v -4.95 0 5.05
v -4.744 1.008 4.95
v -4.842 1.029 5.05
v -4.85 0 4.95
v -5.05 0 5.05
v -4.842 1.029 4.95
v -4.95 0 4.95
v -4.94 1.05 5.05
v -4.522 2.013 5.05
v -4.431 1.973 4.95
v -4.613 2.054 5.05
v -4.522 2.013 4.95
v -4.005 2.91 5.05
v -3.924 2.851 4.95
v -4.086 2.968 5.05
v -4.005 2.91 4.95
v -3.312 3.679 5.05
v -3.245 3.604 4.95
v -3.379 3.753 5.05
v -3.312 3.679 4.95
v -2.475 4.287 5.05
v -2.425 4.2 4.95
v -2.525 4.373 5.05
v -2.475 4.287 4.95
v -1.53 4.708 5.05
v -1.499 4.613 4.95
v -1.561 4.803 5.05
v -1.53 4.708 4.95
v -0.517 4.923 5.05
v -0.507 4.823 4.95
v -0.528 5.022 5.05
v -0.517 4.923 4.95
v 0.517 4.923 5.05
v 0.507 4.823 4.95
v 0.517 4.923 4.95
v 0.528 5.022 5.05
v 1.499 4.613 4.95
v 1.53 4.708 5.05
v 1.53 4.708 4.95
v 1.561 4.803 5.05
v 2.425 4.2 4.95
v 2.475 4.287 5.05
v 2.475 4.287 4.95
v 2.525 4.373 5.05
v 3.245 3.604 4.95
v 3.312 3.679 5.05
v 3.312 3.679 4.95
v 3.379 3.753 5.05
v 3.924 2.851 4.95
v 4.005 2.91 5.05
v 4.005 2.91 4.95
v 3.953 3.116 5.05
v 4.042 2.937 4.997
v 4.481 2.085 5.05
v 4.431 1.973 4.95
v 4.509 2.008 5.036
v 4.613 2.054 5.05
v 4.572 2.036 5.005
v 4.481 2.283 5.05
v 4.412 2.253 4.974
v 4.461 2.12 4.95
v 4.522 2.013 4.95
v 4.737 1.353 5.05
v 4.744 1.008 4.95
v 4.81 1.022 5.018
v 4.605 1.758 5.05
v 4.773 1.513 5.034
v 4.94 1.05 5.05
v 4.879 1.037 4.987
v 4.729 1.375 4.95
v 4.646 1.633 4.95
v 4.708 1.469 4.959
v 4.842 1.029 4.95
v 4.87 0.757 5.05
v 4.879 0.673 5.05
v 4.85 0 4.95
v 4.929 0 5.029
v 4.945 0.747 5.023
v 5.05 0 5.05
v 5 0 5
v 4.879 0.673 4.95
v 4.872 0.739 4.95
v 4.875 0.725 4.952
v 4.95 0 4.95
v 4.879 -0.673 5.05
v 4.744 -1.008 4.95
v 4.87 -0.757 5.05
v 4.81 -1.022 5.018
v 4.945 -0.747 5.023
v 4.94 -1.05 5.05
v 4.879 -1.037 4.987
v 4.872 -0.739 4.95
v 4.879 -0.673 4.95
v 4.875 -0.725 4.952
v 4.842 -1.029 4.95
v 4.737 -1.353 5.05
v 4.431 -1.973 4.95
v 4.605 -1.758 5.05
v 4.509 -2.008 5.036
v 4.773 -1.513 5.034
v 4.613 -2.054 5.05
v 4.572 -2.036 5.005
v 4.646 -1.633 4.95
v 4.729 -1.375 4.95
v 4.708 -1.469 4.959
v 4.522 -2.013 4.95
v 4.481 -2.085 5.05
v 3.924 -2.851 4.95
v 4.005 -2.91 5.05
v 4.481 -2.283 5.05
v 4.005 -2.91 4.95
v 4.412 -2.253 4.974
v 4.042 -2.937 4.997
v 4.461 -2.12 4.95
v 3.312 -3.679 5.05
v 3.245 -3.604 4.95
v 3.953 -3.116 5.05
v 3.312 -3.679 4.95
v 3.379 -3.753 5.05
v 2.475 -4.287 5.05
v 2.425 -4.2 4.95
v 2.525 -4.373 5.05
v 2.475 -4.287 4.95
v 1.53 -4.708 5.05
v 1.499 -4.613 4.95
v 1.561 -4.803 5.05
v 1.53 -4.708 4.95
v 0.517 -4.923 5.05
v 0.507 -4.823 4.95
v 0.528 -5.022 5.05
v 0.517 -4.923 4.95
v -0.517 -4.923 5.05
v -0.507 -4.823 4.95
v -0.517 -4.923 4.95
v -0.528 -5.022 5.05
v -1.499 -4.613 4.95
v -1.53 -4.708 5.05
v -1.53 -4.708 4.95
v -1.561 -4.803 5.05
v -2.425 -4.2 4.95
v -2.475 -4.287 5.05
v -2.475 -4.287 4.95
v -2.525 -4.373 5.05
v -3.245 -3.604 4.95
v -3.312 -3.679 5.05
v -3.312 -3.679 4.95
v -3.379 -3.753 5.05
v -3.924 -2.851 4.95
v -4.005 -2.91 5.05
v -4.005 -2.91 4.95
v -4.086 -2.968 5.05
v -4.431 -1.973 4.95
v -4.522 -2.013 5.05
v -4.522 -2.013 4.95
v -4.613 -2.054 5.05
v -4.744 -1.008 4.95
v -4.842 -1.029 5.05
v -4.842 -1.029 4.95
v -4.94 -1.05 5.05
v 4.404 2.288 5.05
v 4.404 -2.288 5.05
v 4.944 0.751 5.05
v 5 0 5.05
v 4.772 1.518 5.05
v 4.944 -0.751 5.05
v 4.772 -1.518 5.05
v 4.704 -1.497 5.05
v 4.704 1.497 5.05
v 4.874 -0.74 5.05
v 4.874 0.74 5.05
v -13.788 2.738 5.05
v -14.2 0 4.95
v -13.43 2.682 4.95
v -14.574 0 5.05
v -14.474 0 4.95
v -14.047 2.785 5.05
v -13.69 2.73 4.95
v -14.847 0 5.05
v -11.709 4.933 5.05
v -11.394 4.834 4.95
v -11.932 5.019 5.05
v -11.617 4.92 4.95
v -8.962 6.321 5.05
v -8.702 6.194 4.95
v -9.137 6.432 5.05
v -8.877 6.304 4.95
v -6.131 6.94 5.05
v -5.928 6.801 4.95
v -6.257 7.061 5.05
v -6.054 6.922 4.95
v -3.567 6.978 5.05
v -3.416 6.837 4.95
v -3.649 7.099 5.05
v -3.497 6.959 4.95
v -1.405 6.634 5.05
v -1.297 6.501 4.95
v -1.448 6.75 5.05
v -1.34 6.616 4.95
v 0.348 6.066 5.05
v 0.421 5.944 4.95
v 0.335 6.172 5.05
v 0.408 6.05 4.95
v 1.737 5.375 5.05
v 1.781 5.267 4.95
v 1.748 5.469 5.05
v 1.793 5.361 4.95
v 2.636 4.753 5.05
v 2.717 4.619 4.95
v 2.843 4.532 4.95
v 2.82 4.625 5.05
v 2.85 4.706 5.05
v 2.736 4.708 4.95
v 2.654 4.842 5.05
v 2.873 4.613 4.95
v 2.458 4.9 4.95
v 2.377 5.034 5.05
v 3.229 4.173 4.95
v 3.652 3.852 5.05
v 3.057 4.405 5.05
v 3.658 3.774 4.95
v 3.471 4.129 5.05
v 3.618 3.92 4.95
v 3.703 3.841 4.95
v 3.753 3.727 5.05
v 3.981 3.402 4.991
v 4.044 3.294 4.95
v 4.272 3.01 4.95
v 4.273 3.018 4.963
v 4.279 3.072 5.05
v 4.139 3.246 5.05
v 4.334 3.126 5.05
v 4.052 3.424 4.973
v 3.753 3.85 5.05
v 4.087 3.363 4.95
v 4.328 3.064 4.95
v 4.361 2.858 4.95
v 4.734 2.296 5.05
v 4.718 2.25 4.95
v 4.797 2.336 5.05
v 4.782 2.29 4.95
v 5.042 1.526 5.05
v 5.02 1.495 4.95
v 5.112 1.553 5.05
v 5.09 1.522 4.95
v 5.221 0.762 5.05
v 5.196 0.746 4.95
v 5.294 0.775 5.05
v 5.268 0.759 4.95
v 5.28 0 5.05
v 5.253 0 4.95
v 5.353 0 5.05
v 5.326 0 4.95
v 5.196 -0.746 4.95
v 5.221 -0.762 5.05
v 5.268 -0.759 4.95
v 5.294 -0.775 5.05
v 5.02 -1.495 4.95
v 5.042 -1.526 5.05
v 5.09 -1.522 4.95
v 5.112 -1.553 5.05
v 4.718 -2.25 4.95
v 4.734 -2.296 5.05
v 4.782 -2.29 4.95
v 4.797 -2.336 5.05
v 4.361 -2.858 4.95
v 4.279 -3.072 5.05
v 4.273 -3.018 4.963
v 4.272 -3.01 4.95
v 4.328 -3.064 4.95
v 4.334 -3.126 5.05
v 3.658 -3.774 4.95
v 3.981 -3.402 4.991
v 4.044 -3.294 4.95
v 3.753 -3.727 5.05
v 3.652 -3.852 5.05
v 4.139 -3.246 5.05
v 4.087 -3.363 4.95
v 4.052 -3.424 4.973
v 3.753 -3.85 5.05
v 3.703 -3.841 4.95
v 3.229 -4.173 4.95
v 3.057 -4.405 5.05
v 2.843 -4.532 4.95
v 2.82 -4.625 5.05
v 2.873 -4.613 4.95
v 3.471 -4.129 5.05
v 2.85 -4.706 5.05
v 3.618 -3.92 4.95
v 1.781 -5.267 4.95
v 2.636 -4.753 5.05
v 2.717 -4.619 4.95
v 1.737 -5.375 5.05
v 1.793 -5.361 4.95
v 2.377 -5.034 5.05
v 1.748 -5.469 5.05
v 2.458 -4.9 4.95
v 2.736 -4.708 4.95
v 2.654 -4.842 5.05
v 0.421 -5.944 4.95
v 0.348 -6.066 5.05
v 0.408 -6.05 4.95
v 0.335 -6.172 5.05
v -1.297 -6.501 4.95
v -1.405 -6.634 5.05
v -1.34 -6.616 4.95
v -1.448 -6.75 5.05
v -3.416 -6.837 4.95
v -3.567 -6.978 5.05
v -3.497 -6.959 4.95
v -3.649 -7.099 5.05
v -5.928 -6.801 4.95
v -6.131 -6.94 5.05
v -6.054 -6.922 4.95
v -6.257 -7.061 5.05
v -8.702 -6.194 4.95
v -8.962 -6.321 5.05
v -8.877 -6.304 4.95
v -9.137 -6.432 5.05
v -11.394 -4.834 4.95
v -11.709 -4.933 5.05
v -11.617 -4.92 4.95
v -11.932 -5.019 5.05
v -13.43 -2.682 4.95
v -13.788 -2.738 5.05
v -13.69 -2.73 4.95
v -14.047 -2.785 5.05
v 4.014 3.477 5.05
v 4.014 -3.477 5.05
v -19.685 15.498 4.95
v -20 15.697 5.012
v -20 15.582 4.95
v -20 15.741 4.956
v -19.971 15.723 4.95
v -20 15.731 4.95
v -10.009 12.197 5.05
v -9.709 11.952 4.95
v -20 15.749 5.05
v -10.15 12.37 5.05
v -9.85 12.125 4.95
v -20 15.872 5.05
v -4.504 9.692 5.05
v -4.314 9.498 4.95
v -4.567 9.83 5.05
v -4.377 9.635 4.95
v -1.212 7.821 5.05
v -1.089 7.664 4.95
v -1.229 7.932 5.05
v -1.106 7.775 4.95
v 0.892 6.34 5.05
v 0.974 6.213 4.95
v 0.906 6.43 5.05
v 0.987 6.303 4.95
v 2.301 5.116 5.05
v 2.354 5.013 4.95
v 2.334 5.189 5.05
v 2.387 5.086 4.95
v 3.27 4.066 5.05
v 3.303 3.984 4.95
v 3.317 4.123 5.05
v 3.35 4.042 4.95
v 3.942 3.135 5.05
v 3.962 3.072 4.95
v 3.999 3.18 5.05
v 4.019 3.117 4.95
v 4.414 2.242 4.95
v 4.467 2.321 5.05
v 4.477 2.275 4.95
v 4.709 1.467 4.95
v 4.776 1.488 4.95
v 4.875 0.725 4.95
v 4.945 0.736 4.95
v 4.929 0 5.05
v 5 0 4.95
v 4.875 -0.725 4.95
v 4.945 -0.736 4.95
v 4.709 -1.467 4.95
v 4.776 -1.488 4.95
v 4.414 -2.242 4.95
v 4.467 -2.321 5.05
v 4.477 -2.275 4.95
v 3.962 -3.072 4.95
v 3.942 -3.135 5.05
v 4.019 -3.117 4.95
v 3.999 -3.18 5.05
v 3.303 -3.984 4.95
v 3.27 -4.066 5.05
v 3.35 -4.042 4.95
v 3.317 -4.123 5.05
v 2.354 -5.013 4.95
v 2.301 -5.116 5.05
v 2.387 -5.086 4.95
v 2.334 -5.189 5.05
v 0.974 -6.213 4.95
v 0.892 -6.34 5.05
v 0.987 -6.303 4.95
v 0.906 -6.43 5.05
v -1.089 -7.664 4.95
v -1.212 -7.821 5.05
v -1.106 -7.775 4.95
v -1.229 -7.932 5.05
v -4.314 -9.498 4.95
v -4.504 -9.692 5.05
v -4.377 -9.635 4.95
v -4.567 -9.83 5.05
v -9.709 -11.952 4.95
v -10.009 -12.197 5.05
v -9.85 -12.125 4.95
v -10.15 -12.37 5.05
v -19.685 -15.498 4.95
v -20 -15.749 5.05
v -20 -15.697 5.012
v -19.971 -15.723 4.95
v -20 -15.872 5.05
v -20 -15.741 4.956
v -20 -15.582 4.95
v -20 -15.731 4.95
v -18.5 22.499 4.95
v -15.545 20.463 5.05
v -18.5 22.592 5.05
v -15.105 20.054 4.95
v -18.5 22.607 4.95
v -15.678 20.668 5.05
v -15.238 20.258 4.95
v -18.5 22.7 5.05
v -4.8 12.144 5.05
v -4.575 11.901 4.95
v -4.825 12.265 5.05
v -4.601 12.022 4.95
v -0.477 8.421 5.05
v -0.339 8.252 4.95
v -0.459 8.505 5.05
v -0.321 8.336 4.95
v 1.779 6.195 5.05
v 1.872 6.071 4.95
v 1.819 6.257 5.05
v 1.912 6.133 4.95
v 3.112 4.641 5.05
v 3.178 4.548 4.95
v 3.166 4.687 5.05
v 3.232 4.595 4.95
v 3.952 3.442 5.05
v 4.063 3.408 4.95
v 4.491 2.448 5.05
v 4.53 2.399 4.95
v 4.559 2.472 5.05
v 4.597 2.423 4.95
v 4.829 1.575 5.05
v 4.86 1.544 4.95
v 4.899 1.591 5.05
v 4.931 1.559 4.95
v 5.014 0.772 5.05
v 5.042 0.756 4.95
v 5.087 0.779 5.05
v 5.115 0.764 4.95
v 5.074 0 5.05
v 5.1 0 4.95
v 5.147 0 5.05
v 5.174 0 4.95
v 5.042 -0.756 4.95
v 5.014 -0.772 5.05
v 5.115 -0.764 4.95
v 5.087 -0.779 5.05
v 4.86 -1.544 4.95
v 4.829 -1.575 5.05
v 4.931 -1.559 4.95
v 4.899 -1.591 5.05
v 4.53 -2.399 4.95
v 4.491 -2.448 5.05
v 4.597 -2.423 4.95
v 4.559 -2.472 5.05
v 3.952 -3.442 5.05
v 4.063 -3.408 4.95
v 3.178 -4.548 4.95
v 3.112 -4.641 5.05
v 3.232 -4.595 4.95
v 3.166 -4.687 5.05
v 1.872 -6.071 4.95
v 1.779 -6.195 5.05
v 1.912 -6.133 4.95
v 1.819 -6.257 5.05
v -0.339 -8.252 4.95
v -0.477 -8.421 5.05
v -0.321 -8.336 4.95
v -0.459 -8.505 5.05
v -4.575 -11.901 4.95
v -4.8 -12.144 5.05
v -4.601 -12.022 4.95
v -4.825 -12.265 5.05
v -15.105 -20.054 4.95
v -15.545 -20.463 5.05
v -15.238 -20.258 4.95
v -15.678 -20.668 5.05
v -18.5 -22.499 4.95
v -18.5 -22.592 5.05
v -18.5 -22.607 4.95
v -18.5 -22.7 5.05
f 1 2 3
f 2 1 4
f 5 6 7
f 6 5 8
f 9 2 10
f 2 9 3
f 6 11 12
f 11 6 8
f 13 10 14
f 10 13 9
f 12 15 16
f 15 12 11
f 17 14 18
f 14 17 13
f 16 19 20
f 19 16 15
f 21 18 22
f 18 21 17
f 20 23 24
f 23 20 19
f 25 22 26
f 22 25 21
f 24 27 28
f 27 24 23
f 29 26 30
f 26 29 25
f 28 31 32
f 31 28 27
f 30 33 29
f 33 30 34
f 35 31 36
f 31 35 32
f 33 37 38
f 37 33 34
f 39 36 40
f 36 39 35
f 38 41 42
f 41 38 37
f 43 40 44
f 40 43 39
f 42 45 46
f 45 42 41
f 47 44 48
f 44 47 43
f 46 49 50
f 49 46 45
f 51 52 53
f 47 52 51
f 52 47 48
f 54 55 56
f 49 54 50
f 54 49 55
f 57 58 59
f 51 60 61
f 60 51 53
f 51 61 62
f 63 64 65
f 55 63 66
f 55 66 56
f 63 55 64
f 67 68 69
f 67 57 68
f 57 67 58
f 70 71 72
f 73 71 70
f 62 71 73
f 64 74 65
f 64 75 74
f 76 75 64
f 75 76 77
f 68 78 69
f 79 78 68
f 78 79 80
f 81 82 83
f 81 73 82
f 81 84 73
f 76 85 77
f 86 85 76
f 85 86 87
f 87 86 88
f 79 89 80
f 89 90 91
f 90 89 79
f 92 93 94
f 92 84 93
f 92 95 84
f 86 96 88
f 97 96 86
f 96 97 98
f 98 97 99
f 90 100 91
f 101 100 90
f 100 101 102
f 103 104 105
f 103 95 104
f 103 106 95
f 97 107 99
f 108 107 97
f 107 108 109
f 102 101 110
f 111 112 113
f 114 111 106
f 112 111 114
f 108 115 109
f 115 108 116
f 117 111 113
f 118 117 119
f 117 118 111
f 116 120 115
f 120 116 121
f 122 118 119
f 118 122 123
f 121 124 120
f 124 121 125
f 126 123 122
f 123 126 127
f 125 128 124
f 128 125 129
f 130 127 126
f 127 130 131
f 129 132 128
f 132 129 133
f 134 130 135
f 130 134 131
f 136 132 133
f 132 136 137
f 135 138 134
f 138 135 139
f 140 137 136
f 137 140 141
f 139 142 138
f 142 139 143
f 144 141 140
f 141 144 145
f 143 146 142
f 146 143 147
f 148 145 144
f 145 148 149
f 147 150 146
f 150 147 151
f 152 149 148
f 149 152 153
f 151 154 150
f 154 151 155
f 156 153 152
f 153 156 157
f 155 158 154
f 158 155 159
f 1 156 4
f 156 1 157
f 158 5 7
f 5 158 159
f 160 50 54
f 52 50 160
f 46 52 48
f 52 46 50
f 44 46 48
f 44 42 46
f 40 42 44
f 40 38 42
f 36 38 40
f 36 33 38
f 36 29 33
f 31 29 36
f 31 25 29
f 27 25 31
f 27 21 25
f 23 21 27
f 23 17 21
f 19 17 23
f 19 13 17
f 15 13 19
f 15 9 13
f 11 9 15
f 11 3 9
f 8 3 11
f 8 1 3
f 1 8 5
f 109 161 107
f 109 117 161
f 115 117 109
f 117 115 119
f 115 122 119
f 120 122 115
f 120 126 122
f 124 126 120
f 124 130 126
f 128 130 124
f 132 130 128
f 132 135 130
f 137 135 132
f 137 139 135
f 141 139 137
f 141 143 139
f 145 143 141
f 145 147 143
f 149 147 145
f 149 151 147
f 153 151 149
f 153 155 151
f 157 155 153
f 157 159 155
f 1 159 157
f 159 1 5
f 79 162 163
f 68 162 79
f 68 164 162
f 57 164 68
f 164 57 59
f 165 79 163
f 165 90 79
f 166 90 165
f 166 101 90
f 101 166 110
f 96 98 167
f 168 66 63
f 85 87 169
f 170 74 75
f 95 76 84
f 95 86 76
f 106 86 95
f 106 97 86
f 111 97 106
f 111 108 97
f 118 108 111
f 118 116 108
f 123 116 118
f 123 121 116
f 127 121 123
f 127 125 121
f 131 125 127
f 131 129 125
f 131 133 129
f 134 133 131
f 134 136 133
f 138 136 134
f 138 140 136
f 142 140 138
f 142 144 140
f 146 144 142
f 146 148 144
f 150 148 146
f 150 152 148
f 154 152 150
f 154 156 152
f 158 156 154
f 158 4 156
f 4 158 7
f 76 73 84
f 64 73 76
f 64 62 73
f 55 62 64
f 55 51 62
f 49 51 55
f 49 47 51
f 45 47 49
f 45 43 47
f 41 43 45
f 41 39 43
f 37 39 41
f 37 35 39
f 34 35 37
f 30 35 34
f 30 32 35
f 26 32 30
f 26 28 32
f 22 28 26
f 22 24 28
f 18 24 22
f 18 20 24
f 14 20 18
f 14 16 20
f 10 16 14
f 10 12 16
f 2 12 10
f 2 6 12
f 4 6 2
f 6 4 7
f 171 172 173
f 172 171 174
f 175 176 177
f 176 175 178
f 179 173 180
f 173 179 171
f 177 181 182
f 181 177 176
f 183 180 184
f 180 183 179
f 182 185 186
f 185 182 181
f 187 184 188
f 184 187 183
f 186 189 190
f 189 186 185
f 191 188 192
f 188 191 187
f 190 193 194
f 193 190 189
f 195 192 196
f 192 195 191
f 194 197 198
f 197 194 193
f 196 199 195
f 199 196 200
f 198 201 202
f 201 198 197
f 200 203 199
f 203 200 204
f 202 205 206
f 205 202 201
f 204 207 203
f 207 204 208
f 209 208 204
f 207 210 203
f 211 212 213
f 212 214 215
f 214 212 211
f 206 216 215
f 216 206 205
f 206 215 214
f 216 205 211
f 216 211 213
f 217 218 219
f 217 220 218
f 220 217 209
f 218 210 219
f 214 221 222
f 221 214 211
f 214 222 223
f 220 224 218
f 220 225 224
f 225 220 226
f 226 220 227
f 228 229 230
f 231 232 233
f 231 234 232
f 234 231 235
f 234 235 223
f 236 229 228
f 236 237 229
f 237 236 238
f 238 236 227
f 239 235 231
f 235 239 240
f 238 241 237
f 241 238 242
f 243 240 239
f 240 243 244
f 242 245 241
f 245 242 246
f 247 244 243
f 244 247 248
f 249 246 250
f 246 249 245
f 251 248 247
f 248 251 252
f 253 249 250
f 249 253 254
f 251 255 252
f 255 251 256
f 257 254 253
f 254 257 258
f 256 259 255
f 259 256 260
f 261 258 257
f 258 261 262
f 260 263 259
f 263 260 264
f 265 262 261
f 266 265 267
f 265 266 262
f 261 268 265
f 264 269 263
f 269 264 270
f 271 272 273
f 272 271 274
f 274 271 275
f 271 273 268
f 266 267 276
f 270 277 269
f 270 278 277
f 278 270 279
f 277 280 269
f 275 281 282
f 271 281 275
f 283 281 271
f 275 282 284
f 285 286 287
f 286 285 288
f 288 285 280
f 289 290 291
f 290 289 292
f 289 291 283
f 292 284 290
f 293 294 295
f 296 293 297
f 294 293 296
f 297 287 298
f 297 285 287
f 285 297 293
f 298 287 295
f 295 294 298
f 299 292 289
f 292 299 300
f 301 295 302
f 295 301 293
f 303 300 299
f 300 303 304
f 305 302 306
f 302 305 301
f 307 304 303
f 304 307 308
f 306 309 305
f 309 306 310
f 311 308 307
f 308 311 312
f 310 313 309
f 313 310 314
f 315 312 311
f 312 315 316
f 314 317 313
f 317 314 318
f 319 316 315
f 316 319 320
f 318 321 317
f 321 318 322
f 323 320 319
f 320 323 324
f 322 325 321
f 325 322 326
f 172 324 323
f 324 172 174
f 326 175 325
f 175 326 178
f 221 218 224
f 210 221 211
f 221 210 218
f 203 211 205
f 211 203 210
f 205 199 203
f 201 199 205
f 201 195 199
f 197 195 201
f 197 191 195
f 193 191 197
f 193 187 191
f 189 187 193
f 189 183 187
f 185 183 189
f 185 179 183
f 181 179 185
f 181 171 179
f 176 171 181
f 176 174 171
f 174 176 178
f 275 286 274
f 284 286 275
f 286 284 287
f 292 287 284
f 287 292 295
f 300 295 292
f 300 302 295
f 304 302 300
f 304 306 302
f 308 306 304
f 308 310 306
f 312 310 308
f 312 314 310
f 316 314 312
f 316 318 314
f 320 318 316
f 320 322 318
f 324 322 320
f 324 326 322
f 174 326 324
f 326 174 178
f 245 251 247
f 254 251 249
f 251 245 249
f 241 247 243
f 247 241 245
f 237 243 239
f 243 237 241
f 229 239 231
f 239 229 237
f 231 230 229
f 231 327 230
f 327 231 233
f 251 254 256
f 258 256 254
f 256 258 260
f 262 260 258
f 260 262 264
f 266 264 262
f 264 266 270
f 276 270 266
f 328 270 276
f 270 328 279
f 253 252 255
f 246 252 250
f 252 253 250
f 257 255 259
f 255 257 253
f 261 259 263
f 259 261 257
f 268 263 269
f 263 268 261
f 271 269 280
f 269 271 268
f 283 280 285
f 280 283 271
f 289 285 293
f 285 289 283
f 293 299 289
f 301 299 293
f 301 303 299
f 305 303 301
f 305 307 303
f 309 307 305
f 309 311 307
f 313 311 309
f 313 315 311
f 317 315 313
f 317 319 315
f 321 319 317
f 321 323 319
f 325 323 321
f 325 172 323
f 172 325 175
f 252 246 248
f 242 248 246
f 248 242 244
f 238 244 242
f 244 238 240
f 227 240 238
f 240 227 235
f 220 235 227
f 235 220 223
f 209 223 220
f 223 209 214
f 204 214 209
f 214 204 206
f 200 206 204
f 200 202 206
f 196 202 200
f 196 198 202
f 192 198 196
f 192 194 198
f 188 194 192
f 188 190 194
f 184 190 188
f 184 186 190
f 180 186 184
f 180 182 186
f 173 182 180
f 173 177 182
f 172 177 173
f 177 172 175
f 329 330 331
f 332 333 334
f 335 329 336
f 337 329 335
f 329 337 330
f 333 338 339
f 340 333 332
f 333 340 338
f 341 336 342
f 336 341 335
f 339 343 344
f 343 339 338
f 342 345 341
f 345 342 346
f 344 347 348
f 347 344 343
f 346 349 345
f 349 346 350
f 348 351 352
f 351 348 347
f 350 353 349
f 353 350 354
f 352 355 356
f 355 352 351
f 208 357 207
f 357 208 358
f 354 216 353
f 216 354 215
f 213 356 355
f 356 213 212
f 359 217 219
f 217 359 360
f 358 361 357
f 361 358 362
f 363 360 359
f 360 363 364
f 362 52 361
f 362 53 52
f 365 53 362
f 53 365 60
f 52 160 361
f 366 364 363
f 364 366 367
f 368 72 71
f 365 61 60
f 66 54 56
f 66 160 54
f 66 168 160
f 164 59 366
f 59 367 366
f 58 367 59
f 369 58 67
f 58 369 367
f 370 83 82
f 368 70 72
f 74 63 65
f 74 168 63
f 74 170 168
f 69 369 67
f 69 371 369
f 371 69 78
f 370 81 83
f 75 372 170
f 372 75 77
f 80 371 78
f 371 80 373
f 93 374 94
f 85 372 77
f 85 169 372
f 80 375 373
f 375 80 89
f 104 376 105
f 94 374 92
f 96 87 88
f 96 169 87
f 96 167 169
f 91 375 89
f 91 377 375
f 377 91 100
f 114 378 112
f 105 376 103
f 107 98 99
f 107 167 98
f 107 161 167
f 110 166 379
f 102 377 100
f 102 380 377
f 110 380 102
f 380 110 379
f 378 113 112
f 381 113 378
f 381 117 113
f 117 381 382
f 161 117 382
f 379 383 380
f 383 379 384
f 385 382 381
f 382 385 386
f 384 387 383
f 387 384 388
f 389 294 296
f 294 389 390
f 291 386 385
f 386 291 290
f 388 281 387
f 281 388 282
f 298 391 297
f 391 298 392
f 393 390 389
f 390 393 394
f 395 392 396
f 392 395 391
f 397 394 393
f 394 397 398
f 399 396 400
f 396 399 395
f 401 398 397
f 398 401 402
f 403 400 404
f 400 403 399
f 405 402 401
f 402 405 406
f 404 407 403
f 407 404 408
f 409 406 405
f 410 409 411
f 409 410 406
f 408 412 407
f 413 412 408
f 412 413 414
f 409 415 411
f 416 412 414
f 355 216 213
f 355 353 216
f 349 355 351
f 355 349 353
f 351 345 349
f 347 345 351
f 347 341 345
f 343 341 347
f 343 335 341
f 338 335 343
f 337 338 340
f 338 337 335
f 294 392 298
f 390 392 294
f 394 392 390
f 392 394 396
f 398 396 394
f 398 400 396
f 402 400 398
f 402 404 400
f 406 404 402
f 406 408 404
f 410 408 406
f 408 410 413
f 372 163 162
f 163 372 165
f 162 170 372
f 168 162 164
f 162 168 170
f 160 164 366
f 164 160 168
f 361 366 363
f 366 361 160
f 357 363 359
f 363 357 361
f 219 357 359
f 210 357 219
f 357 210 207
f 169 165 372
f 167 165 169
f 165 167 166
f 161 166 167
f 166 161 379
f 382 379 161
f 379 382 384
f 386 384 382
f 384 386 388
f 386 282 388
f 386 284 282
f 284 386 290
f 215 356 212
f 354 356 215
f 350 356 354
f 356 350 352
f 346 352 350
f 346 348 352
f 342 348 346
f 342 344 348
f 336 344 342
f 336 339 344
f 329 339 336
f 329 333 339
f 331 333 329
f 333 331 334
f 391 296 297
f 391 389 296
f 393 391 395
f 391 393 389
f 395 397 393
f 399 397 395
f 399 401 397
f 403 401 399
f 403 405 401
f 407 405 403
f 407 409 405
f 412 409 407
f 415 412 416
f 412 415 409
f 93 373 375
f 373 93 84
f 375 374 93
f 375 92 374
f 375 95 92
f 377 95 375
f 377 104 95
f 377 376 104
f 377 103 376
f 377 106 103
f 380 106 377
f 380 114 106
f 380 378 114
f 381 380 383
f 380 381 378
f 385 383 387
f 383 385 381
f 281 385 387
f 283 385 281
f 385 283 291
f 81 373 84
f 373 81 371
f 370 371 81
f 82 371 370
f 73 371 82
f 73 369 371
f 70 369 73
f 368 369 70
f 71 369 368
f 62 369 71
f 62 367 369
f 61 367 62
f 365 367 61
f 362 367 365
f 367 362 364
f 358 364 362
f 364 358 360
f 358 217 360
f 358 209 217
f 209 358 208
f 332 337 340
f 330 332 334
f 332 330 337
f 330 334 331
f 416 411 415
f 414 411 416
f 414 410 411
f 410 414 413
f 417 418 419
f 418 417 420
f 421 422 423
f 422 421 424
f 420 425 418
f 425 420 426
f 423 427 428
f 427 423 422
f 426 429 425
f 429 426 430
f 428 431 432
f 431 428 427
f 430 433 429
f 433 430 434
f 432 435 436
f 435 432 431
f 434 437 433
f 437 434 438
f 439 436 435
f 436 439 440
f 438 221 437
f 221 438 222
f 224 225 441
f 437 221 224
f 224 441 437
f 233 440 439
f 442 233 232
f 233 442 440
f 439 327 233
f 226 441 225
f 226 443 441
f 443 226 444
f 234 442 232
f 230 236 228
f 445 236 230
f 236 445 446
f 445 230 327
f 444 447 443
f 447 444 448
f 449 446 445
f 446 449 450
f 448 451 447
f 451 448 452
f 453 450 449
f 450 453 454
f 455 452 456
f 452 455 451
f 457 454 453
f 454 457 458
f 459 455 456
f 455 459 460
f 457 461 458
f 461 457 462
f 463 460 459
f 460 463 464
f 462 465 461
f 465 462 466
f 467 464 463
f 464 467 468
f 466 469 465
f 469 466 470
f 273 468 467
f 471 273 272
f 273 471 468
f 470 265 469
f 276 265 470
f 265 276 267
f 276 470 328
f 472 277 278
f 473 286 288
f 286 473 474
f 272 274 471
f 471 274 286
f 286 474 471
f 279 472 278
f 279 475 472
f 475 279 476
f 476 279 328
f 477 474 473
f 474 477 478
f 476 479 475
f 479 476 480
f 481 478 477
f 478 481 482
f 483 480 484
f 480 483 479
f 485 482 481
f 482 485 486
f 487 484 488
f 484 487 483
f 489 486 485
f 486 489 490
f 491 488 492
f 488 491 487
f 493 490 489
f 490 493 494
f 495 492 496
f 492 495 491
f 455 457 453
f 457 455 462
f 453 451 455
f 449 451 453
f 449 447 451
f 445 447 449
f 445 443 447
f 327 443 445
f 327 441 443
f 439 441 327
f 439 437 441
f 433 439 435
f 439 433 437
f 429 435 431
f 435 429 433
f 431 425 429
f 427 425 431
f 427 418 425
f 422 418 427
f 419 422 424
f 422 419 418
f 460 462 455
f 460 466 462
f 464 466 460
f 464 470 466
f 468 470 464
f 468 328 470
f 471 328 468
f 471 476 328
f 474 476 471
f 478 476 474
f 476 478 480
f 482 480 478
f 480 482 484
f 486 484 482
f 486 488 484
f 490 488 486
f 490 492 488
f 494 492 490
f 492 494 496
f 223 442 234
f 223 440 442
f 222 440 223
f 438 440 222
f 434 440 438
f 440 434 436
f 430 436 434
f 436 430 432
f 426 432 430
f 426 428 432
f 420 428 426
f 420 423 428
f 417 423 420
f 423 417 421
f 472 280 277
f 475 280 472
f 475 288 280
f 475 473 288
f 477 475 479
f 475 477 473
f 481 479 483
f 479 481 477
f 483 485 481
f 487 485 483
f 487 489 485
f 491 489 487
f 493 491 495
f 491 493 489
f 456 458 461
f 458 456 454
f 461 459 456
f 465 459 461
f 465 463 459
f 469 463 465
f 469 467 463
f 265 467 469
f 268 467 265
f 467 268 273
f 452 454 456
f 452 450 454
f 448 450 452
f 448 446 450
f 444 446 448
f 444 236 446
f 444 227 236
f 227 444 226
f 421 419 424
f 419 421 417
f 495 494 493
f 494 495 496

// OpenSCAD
union() {
	union() {
		rotate(a = [0, 0, 0]) {
			intersection() {
				rotate_extrude(convexity = 20) {
					polygon(paths = [[0, 1, 2, 3]], points = [[0, 0], [50, 50], [49.9000000000, 50], [0, 0.1000000000]]);
				}
				rotate(a = [0, 0, 0]) {
					translate(v = [0, 0, 5]) {
						cube(center = true, size = [50, 50, 0.1000000000]);
					}
				}
			}
		}
		translate(v = [4, 0, 0]) {
			rotate(a = [0, -30, 0]) {
				intersection() {
					rotate_extrude(convexity = 20) {
						polygon(paths = [[0, 1, 2, 3]], points = [[0, 0], [50, 50], [49.9000000000, 50], [0, 0.1000000000]]);
					}
					rotate(a = [0, 30, 0]) {
						translate(v = [0, 0, 5]) {
							cube(center = true, size = [50, 50, 0.1000000000]);
						}
					}
				}
			}
		}
	}
	union() {
		translate(v = [5, 0, 0]) {
			rotate(a = [0, -45, 0]) {
				intersection() {
					rotate_extrude(convexity = 20) {
						polygon(paths = [[0, 1, 2, 3]], points = [[0, 0], [50, 50], [49.9000000000, 50], [0, 0.1000000000]]);
					}
					rotate(a = [0, 45, 0]) {
						translate(v = [0, 0, 5]) {
							cube(center = true, size = [50, 50, 0.1000000000]);
						}
					}
				}
			}
		}
		translate(v = [6.5000000000, 0, 0]) {
			rotate(a = [0, -60, 0]) {
				intersection() {
					rotate_extrude(convexity = 20) {
						polygon(paths = [[0, 1, 2, 3]], points = [[0, 0], [50, 50], [49.9000000000, 50], [0, 0.1000000000]]);
					}
					rotate(a = [0, 60, 0]) {
						translate(v = [0, 0, 5]) {
							cube(center = true, size = [50, 50, 0.1000000000]);
						}
					}
				}
			}
		}
	}
}
